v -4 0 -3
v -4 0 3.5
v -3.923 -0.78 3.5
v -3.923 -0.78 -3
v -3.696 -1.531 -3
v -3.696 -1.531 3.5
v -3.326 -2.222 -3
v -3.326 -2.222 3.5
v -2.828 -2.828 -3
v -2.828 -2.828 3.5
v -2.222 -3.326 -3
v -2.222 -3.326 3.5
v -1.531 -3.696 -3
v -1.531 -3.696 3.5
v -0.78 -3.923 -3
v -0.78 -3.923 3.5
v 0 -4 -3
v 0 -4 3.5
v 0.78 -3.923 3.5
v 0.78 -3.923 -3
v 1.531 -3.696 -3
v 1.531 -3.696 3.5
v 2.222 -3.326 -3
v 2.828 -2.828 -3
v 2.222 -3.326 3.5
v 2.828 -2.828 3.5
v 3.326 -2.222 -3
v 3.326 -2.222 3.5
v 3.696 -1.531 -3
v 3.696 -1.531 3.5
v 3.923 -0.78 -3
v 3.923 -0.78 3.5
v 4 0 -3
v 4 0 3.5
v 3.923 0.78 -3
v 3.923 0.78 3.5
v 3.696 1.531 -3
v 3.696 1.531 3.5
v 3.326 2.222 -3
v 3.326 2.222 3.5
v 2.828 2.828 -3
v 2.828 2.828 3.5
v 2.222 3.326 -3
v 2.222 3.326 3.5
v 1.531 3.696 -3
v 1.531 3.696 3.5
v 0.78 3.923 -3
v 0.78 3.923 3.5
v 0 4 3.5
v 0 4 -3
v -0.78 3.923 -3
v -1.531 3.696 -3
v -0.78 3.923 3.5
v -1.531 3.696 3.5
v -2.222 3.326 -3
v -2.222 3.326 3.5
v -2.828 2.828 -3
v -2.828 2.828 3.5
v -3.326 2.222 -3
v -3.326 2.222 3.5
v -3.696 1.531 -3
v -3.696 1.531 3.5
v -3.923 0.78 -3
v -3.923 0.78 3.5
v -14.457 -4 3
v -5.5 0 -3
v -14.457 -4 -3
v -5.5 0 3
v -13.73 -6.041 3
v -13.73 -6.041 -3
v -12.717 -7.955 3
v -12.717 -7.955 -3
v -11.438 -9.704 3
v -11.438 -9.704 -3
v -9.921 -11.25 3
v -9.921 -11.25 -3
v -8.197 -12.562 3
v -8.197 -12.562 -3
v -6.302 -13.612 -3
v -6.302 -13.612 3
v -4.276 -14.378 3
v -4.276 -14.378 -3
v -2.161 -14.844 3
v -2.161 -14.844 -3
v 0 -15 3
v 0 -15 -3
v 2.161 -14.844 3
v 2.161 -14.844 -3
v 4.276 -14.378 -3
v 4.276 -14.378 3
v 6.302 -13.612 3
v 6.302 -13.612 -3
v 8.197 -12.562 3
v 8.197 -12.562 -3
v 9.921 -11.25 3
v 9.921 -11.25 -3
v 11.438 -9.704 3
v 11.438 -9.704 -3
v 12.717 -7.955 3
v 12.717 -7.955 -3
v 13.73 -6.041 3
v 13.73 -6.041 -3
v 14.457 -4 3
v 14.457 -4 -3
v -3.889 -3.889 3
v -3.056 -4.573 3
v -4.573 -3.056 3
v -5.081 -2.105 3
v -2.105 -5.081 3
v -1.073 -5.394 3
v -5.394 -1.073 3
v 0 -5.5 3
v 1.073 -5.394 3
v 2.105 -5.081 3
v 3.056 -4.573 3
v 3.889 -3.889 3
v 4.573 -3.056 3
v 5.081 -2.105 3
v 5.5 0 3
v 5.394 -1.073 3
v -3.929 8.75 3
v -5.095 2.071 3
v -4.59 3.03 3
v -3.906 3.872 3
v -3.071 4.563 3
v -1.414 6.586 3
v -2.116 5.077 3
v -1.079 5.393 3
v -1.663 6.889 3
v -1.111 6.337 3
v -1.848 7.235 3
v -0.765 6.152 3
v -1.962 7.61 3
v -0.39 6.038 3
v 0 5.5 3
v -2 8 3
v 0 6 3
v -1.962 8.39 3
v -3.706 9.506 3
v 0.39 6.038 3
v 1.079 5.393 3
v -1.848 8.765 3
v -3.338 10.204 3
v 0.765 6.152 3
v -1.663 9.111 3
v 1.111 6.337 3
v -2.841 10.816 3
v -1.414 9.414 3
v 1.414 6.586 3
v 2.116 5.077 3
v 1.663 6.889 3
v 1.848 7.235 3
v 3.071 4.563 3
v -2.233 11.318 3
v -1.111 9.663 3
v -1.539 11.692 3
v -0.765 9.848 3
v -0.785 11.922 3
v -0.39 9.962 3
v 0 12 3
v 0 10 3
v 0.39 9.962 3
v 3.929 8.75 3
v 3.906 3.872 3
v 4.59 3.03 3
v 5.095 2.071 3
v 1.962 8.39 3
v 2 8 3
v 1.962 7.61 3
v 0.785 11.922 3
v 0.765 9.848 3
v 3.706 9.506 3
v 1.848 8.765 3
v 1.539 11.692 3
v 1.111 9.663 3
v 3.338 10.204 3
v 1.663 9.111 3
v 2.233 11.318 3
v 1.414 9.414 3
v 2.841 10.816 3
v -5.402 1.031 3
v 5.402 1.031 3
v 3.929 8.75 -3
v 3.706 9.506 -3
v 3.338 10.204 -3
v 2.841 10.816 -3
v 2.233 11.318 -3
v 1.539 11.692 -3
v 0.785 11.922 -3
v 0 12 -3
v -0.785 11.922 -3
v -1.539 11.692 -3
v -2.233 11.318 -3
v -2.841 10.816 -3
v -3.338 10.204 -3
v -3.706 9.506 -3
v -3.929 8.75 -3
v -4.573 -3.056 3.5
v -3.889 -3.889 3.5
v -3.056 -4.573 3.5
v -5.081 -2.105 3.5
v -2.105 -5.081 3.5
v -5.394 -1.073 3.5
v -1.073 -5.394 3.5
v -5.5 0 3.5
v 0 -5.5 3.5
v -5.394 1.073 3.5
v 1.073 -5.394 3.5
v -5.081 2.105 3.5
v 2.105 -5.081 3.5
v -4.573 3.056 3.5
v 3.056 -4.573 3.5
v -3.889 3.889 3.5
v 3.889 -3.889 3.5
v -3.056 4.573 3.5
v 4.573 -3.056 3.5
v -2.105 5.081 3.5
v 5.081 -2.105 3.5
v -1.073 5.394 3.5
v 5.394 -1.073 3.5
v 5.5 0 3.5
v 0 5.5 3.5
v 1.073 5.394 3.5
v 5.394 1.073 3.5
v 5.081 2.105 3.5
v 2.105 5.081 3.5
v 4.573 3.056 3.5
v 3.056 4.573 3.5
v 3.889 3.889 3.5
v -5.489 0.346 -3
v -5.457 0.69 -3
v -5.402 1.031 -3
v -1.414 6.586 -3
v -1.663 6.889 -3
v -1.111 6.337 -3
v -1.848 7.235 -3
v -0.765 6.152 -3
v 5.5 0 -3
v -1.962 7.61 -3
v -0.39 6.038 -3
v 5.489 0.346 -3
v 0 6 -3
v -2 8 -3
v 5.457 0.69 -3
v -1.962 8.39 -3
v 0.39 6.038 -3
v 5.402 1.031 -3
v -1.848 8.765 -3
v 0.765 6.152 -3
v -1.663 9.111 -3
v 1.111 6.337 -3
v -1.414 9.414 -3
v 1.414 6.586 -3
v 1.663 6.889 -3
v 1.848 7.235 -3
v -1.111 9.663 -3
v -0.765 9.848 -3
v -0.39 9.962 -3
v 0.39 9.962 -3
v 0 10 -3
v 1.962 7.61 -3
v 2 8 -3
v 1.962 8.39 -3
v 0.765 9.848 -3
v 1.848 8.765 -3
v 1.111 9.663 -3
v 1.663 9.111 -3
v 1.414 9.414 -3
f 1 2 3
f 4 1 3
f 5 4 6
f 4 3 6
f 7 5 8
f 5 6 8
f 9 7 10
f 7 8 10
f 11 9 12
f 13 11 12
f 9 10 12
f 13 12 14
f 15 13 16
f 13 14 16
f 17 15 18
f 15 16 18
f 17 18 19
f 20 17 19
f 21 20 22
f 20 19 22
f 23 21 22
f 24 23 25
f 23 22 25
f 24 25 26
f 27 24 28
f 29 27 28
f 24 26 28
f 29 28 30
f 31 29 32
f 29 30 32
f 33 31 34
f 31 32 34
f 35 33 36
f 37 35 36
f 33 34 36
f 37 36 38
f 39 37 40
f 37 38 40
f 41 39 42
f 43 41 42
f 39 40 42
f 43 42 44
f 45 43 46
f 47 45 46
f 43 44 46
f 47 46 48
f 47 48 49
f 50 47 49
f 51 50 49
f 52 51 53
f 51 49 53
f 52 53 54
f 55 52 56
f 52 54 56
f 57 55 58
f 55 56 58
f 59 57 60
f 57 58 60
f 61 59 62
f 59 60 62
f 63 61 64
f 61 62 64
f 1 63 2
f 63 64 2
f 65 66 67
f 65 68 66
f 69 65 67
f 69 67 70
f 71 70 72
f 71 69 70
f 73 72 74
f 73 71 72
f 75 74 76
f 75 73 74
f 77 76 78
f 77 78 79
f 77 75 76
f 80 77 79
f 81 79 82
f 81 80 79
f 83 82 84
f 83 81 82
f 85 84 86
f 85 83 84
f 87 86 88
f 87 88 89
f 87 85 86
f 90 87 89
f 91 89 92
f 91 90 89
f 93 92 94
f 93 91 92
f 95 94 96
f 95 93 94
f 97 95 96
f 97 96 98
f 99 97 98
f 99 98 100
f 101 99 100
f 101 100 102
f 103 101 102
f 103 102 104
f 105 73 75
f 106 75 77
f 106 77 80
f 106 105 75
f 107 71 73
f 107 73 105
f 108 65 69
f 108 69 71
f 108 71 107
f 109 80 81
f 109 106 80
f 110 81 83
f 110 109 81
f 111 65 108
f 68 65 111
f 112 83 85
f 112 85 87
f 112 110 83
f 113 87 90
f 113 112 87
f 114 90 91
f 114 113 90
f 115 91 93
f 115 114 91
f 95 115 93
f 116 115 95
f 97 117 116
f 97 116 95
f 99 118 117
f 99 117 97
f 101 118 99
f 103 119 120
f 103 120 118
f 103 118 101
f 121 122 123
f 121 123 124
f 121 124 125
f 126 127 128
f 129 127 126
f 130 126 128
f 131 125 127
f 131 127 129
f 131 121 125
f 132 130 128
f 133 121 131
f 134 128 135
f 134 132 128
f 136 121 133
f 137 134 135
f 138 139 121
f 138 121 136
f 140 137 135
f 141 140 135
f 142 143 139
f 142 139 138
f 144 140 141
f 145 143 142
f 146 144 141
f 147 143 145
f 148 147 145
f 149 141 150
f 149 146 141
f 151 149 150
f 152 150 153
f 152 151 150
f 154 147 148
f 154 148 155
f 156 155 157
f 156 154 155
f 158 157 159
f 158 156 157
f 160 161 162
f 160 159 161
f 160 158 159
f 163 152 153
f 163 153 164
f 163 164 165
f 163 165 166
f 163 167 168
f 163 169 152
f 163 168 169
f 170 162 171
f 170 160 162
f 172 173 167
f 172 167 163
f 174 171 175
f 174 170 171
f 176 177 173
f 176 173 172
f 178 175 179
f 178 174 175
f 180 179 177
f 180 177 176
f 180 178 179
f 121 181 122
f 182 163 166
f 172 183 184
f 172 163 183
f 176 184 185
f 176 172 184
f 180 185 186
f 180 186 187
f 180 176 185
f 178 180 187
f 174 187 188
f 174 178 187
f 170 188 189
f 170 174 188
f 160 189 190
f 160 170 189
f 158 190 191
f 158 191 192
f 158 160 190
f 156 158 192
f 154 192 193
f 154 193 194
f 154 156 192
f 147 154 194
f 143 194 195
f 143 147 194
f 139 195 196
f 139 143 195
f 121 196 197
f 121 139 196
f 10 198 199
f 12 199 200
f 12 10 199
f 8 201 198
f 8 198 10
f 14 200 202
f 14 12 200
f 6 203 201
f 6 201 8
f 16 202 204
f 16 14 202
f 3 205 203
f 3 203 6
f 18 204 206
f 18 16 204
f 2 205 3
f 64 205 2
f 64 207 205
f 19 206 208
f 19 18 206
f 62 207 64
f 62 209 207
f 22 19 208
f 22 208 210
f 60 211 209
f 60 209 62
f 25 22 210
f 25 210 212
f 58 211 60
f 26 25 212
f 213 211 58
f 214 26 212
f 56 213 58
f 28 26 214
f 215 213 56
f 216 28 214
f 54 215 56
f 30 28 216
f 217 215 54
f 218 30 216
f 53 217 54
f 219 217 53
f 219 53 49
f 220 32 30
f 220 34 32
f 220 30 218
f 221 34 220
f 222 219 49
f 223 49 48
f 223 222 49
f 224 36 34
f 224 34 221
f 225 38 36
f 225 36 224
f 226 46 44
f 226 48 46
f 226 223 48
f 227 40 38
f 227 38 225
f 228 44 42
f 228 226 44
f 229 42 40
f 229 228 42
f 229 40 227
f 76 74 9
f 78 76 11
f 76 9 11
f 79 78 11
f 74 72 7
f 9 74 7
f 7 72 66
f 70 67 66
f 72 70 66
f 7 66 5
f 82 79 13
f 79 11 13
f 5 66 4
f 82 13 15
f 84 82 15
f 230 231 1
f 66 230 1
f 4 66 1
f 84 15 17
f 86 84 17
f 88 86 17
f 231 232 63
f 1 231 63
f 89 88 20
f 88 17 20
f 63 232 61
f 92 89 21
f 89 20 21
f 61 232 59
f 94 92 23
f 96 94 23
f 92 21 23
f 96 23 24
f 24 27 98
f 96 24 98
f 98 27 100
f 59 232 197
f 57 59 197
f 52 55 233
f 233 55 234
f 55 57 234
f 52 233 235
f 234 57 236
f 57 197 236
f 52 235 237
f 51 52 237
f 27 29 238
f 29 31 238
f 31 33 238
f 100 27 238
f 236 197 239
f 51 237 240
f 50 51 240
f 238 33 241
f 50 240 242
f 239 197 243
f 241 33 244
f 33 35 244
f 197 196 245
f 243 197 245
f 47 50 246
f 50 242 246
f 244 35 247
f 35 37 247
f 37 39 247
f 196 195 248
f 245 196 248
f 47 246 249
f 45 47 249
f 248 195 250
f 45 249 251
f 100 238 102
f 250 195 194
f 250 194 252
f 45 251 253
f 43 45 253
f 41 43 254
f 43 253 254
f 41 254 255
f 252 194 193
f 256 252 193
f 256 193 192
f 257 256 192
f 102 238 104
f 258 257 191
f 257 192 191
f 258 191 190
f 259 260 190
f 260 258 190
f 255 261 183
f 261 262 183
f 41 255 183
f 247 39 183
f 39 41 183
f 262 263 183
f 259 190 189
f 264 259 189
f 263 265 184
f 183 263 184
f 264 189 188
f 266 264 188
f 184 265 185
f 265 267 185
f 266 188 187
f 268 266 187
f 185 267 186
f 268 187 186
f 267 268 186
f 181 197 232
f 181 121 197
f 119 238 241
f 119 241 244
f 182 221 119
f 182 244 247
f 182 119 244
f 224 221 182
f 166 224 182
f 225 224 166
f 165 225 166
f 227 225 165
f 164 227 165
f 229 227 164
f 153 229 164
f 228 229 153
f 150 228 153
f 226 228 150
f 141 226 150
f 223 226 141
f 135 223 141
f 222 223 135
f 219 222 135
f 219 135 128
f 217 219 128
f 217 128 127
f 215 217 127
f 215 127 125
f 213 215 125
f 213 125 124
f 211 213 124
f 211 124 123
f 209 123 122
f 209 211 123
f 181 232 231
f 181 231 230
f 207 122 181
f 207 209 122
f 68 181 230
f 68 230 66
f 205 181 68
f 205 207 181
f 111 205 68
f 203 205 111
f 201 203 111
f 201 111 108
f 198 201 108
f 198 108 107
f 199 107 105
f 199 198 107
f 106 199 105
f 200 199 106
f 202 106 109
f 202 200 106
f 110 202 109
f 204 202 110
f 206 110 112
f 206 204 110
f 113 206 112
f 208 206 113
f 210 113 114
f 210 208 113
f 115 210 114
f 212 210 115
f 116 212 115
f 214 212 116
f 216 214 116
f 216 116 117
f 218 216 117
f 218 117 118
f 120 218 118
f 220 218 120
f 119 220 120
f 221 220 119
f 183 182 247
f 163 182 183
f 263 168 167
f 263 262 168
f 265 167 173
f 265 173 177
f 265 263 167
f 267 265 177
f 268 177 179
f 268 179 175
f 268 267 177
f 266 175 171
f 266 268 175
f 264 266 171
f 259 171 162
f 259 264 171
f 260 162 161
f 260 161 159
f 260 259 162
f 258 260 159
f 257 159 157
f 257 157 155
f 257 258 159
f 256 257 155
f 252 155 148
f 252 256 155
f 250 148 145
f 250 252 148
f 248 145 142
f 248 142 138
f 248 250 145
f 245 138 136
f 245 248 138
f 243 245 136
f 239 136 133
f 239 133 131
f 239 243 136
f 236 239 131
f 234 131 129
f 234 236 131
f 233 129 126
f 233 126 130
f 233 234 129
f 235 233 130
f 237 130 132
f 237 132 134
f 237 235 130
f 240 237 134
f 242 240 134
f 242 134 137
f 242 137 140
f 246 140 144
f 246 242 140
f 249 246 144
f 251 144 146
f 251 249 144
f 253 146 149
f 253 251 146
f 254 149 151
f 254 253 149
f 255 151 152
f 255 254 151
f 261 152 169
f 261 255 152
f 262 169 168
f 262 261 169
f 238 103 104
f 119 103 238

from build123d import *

# Parameters (mm, degrees)
BOSS_EXTRUDE1_DEPTH   = 3
SKETCH1_R             = 2
BOSS_EXTRUDE1_2_DEPTH = 3
BOSS_EXTRUDE2_START   = 3.5
SKETCH1_4_R           = 5.5
SKETCH1_4_R_2         = 4
BOSS_EXTRUDE2_DEPTH   = 6.5


with BuildPart() as part:
    # Sketch1 → Boss-Extrude1 (new, symmetric)
    with BuildSketch(Plane.XY):
        with BuildLine():
            Line((-5.5, 0), (-14.456832295, -4))
            ThreePointArc((-14.456832295, -4), (0, -15), (14.456832295, -4))
            Line((14.456832295, -4), (5.5, 0))
            ThreePointArc((5.5, 0), (0, -5.5), (-5.5, 0))
        make_face()
    extrude(amount=BOSS_EXTRUDE1_DEPTH, both=True)



with BuildPart() as body_2:
    # Sketch1 → Boss-Extrude1 2 (new, symmetric)
    with BuildSketch(Plane.XY):
        with BuildLine():
            Line((-3.929058411, 8.75), (-5.402455316, 1.03125))
            ThreePointArc((-5.402455316, 1.03125), (0, 5.5), (5.402455316, 1.03125))
            Line((5.402455316, 1.03125), (3.929058411, 8.75))
            ThreePointArc((3.929058411, 8.75), (0, 12), (-3.929058411, 8.75))
        make_face()
        with Locations((0, 8)):
            Circle(SKETCH1_R, mode=Mode.SUBTRACT)
    extrude(amount=BOSS_EXTRUDE1_2_DEPTH, both=True)


with BuildPart() as part_1:
    add(part.part)

    add(body_2.part)  # Boss-Extrude2 merges body 2
    # Sketch1<4> → Boss-Extrude2 (add)
    with BuildSketch(Plane.XY.offset(BOSS_EXTRUDE2_START)):
        Circle(SKETCH1_4_R)
        with Locations(Location((0, 0, 0), (0, 0, 180))):
            Circle(SKETCH1_4_R_2, mode=Mode.SUBTRACT)
    extrude(amount=-BOSS_EXTRUDE2_DEPTH)


solid = part_1.part
